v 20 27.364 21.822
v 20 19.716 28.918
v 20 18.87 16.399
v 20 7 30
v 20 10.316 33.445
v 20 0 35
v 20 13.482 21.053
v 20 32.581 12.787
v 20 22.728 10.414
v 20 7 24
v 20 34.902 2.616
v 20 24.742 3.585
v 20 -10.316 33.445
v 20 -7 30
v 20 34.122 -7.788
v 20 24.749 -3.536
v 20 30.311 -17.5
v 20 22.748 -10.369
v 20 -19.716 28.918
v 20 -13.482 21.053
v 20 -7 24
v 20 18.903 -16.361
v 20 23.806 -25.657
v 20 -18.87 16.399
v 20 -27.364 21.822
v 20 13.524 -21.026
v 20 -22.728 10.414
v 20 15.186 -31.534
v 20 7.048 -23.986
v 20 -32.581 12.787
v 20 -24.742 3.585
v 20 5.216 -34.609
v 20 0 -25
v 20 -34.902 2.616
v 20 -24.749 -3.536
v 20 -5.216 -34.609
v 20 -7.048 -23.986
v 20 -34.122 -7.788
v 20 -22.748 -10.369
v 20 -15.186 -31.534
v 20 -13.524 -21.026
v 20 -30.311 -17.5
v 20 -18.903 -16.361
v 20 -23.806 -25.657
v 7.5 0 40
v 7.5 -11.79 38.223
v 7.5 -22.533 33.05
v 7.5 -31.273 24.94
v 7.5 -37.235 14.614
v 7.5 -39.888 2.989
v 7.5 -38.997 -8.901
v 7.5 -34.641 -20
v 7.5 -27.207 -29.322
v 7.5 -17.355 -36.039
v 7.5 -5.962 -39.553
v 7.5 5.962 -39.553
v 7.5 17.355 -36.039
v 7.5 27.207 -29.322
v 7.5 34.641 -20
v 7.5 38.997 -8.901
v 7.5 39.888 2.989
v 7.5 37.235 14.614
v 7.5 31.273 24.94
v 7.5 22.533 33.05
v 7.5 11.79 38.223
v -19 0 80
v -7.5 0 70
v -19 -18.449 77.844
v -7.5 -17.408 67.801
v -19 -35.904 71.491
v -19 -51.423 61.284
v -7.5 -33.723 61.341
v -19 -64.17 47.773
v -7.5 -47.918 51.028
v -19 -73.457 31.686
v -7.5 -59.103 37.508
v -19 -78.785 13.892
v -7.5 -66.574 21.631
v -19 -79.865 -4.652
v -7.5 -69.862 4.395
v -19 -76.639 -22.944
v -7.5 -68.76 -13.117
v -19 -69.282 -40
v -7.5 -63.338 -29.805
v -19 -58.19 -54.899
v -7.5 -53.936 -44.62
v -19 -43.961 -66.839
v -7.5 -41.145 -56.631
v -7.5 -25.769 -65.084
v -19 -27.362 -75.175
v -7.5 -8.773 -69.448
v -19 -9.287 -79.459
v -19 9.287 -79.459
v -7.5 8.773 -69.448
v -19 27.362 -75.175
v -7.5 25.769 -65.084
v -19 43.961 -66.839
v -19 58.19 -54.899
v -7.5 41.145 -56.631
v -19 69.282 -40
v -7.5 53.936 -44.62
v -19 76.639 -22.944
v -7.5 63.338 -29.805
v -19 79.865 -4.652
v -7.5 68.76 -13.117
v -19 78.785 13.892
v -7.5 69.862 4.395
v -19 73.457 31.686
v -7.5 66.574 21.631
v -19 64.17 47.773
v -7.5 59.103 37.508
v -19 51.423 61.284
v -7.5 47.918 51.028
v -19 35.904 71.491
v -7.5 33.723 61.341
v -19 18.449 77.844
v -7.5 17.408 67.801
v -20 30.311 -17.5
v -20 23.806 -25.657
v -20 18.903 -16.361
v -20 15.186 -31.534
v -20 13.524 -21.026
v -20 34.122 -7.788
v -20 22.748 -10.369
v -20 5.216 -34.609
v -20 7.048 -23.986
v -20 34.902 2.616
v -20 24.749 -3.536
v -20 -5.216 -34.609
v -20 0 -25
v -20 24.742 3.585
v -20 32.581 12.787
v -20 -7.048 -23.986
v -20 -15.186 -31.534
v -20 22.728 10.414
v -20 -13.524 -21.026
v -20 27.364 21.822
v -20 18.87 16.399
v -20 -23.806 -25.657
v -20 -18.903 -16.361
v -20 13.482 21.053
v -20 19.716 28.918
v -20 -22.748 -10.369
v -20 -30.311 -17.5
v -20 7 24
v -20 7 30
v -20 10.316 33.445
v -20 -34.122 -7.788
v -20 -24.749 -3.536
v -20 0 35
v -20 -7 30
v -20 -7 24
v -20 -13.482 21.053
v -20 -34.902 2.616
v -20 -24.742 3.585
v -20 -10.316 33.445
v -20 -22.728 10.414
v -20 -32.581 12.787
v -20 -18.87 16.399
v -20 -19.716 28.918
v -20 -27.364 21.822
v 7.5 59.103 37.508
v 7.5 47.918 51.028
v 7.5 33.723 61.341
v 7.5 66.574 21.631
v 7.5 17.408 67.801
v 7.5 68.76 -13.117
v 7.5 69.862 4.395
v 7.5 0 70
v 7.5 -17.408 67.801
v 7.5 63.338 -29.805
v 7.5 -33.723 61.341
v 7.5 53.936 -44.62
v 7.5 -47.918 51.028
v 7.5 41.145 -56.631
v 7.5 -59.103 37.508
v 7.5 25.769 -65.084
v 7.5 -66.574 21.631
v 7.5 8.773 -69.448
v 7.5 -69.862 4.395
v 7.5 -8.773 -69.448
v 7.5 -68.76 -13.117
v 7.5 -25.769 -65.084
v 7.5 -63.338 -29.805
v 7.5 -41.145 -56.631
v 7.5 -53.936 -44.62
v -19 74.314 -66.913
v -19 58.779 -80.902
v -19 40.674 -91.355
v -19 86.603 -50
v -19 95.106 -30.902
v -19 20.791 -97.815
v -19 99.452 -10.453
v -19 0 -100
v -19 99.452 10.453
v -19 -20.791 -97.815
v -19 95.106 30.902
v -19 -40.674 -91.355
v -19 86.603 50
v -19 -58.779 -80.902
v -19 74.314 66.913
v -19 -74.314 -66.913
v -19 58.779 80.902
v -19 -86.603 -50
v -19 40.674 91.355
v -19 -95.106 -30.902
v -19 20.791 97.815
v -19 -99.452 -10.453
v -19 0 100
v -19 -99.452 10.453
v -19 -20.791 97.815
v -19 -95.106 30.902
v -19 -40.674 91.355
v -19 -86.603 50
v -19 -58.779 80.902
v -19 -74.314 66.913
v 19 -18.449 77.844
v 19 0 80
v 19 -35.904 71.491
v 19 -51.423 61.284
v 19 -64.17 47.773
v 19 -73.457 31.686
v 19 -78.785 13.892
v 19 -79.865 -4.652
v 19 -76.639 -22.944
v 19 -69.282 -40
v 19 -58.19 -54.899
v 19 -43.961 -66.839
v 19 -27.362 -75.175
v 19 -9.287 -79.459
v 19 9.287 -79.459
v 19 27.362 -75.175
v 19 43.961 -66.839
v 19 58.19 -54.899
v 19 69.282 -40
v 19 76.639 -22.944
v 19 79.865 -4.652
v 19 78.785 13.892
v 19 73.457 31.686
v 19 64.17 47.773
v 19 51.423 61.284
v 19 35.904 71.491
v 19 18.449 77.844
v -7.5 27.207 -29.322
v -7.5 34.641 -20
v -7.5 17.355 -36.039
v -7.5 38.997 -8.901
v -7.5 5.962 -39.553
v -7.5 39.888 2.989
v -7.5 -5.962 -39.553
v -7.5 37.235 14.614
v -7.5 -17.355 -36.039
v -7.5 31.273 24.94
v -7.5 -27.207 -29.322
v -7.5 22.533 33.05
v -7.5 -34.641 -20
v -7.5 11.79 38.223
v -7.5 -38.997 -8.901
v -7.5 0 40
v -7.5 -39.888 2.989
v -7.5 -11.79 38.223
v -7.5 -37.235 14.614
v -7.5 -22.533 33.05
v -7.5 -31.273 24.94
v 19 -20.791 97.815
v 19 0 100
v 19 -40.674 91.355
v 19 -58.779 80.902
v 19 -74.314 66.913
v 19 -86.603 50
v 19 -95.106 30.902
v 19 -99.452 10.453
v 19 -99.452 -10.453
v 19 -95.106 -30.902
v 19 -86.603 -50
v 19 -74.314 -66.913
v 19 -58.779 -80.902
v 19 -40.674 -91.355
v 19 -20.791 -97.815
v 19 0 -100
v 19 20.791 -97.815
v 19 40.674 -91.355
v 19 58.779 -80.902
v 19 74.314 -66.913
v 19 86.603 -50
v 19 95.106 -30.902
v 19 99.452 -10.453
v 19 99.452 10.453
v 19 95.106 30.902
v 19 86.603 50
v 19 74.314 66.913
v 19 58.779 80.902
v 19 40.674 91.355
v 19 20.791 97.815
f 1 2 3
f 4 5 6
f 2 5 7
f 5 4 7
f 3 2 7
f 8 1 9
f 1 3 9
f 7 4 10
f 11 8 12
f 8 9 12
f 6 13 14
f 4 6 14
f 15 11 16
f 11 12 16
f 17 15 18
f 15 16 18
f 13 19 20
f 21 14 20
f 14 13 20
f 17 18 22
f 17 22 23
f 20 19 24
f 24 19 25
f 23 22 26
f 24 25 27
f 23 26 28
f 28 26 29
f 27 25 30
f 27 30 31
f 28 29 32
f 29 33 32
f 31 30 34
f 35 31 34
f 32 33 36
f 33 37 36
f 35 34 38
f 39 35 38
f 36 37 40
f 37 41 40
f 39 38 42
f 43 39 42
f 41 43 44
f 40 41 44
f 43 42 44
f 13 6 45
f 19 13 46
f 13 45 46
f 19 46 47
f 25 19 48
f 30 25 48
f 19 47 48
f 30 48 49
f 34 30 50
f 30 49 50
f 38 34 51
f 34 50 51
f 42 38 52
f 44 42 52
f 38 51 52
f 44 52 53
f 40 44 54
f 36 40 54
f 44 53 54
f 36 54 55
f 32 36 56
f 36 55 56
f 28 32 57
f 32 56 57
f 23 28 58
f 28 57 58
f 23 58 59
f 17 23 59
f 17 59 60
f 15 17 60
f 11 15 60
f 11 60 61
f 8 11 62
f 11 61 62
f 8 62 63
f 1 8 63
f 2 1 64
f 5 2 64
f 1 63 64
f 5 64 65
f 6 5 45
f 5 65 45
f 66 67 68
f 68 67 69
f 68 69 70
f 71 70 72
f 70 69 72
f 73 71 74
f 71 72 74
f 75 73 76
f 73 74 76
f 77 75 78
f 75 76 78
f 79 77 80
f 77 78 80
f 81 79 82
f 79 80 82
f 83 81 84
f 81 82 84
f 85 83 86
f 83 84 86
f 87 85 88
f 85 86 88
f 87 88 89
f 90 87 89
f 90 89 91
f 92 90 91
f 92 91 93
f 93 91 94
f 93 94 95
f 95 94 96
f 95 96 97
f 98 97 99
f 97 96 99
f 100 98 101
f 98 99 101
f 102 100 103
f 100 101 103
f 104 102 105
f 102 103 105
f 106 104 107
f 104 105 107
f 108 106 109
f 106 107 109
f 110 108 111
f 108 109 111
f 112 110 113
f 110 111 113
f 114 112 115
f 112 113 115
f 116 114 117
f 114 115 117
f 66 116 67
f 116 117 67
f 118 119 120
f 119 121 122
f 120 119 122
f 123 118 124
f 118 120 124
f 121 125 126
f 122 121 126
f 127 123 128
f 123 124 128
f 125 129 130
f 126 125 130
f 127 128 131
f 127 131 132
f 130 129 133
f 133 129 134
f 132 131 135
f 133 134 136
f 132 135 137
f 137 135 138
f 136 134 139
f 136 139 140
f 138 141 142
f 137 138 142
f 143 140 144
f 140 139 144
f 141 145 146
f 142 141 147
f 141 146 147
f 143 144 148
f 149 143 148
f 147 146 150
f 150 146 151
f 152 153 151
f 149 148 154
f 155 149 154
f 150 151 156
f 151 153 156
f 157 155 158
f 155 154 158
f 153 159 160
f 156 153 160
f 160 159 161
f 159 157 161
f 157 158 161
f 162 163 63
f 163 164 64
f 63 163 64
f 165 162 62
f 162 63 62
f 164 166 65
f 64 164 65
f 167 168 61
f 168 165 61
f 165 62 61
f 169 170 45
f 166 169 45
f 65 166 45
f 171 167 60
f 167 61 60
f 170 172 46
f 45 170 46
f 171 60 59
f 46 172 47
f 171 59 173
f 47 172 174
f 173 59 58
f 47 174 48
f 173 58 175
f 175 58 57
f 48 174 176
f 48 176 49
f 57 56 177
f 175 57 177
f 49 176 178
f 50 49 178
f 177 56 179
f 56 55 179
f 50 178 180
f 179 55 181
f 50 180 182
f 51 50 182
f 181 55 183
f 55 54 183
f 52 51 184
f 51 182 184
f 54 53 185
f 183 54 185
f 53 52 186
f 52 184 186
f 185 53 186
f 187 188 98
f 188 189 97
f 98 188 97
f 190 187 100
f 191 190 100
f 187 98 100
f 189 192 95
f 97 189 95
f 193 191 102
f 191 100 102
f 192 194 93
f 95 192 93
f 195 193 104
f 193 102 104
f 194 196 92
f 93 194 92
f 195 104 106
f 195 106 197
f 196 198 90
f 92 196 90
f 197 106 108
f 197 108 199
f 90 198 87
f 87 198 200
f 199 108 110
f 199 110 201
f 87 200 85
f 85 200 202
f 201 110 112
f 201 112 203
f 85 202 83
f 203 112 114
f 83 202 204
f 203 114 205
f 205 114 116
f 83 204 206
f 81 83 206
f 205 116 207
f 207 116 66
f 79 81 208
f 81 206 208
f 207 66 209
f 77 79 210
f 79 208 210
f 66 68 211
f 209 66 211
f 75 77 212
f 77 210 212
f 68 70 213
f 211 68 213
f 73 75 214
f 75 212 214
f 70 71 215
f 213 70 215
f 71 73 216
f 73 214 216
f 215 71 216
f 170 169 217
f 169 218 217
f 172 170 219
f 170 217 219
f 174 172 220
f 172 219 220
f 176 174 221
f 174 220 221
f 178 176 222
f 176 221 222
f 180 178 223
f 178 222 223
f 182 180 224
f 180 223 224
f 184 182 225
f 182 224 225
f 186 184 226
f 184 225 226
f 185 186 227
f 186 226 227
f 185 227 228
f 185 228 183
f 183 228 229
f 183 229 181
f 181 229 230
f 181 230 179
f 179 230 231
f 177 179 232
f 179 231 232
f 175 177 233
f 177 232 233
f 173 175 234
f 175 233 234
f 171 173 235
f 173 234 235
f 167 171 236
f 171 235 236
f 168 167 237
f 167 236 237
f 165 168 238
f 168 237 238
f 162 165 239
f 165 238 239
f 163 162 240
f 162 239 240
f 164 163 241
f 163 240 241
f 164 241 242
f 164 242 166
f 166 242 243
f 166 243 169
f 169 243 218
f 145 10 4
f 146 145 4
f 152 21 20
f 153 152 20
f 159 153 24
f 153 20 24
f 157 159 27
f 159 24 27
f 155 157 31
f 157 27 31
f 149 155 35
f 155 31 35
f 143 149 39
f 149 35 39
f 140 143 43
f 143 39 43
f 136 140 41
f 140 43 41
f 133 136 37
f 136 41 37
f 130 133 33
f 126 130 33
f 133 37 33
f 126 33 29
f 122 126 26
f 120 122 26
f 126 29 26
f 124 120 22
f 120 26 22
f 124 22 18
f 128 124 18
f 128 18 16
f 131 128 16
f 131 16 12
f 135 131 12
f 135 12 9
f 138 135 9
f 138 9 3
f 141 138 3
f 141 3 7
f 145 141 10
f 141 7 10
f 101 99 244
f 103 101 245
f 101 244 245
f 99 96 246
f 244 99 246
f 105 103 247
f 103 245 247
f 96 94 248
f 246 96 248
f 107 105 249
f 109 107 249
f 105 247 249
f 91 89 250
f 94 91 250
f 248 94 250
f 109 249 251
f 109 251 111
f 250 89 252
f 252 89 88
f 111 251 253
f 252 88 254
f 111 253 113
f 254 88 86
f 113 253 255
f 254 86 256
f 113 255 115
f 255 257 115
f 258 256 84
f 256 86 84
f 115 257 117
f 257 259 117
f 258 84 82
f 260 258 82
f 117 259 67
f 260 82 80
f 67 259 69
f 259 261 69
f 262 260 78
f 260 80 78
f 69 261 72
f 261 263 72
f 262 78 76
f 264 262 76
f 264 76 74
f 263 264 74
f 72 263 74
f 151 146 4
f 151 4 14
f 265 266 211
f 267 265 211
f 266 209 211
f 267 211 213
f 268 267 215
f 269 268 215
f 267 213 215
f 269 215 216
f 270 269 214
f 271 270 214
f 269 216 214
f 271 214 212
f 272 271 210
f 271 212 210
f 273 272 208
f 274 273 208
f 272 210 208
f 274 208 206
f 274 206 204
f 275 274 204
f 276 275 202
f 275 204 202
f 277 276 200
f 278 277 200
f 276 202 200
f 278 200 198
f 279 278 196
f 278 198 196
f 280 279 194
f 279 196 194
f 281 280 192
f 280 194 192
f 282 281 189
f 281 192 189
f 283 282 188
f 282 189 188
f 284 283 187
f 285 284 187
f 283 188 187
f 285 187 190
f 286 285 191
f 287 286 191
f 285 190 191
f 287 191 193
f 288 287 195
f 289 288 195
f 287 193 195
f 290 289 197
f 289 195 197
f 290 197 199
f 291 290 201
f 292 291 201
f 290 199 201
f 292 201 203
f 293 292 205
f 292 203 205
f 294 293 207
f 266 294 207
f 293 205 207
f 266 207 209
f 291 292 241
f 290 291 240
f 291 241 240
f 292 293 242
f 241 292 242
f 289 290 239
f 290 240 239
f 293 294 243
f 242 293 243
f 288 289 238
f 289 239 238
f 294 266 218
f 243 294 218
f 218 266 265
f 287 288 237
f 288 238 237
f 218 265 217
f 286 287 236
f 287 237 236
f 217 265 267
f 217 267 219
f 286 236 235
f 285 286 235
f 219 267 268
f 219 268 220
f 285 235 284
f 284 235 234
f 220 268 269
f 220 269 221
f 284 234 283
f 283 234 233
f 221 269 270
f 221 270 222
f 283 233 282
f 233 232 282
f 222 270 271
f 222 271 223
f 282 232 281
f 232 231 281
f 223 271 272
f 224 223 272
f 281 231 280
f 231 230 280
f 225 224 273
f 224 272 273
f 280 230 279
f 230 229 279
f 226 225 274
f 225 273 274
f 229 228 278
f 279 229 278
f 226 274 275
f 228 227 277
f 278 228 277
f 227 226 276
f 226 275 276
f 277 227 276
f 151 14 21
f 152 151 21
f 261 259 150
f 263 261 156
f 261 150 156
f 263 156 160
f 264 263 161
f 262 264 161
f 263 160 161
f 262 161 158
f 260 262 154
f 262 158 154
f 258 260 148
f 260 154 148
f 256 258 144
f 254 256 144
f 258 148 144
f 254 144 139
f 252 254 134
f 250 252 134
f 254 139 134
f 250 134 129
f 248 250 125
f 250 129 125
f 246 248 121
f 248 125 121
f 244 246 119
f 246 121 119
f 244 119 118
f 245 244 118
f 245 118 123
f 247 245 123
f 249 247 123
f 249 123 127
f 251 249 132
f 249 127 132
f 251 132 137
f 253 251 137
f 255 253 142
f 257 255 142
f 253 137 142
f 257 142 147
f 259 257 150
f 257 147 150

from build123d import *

# Parameters (mm, degrees)
F3_DEPTH = 40.001


with BuildPart() as f1:
    # F0 (on Front) → F1 (revolve)
    with BuildSketch(Plane.XZ):
        Polygon((-20, 25), (0, 25), (20, 25), (20, 35), (7.5, 40), (7.5, 70), (19, 80), (19, 100), (0, 100), (-19, 100), (-19, 80), (-7.5, 70), (-7.5, 40), (-20, 35), align=None)
    revolve(axis=Axis((21.959458, 0, 0), (1, 0, 0)))

    # F2 (on face) → F3 (cut, through all)
    with BuildSketch(Plane.YZ.offset(20)):
        with BuildLine():
            Line((7, 24), (7, 30))
            Line((7, 30), (-7, 30))
            Line((-7, 30), (-7, 24))
            ThreePointArc((-7, 24), (0, 25), (7, 24))
        make_face()
    extrude(amount=-F3_DEPTH, mode=Mode.SUBTRACT)


solid = f1.part
